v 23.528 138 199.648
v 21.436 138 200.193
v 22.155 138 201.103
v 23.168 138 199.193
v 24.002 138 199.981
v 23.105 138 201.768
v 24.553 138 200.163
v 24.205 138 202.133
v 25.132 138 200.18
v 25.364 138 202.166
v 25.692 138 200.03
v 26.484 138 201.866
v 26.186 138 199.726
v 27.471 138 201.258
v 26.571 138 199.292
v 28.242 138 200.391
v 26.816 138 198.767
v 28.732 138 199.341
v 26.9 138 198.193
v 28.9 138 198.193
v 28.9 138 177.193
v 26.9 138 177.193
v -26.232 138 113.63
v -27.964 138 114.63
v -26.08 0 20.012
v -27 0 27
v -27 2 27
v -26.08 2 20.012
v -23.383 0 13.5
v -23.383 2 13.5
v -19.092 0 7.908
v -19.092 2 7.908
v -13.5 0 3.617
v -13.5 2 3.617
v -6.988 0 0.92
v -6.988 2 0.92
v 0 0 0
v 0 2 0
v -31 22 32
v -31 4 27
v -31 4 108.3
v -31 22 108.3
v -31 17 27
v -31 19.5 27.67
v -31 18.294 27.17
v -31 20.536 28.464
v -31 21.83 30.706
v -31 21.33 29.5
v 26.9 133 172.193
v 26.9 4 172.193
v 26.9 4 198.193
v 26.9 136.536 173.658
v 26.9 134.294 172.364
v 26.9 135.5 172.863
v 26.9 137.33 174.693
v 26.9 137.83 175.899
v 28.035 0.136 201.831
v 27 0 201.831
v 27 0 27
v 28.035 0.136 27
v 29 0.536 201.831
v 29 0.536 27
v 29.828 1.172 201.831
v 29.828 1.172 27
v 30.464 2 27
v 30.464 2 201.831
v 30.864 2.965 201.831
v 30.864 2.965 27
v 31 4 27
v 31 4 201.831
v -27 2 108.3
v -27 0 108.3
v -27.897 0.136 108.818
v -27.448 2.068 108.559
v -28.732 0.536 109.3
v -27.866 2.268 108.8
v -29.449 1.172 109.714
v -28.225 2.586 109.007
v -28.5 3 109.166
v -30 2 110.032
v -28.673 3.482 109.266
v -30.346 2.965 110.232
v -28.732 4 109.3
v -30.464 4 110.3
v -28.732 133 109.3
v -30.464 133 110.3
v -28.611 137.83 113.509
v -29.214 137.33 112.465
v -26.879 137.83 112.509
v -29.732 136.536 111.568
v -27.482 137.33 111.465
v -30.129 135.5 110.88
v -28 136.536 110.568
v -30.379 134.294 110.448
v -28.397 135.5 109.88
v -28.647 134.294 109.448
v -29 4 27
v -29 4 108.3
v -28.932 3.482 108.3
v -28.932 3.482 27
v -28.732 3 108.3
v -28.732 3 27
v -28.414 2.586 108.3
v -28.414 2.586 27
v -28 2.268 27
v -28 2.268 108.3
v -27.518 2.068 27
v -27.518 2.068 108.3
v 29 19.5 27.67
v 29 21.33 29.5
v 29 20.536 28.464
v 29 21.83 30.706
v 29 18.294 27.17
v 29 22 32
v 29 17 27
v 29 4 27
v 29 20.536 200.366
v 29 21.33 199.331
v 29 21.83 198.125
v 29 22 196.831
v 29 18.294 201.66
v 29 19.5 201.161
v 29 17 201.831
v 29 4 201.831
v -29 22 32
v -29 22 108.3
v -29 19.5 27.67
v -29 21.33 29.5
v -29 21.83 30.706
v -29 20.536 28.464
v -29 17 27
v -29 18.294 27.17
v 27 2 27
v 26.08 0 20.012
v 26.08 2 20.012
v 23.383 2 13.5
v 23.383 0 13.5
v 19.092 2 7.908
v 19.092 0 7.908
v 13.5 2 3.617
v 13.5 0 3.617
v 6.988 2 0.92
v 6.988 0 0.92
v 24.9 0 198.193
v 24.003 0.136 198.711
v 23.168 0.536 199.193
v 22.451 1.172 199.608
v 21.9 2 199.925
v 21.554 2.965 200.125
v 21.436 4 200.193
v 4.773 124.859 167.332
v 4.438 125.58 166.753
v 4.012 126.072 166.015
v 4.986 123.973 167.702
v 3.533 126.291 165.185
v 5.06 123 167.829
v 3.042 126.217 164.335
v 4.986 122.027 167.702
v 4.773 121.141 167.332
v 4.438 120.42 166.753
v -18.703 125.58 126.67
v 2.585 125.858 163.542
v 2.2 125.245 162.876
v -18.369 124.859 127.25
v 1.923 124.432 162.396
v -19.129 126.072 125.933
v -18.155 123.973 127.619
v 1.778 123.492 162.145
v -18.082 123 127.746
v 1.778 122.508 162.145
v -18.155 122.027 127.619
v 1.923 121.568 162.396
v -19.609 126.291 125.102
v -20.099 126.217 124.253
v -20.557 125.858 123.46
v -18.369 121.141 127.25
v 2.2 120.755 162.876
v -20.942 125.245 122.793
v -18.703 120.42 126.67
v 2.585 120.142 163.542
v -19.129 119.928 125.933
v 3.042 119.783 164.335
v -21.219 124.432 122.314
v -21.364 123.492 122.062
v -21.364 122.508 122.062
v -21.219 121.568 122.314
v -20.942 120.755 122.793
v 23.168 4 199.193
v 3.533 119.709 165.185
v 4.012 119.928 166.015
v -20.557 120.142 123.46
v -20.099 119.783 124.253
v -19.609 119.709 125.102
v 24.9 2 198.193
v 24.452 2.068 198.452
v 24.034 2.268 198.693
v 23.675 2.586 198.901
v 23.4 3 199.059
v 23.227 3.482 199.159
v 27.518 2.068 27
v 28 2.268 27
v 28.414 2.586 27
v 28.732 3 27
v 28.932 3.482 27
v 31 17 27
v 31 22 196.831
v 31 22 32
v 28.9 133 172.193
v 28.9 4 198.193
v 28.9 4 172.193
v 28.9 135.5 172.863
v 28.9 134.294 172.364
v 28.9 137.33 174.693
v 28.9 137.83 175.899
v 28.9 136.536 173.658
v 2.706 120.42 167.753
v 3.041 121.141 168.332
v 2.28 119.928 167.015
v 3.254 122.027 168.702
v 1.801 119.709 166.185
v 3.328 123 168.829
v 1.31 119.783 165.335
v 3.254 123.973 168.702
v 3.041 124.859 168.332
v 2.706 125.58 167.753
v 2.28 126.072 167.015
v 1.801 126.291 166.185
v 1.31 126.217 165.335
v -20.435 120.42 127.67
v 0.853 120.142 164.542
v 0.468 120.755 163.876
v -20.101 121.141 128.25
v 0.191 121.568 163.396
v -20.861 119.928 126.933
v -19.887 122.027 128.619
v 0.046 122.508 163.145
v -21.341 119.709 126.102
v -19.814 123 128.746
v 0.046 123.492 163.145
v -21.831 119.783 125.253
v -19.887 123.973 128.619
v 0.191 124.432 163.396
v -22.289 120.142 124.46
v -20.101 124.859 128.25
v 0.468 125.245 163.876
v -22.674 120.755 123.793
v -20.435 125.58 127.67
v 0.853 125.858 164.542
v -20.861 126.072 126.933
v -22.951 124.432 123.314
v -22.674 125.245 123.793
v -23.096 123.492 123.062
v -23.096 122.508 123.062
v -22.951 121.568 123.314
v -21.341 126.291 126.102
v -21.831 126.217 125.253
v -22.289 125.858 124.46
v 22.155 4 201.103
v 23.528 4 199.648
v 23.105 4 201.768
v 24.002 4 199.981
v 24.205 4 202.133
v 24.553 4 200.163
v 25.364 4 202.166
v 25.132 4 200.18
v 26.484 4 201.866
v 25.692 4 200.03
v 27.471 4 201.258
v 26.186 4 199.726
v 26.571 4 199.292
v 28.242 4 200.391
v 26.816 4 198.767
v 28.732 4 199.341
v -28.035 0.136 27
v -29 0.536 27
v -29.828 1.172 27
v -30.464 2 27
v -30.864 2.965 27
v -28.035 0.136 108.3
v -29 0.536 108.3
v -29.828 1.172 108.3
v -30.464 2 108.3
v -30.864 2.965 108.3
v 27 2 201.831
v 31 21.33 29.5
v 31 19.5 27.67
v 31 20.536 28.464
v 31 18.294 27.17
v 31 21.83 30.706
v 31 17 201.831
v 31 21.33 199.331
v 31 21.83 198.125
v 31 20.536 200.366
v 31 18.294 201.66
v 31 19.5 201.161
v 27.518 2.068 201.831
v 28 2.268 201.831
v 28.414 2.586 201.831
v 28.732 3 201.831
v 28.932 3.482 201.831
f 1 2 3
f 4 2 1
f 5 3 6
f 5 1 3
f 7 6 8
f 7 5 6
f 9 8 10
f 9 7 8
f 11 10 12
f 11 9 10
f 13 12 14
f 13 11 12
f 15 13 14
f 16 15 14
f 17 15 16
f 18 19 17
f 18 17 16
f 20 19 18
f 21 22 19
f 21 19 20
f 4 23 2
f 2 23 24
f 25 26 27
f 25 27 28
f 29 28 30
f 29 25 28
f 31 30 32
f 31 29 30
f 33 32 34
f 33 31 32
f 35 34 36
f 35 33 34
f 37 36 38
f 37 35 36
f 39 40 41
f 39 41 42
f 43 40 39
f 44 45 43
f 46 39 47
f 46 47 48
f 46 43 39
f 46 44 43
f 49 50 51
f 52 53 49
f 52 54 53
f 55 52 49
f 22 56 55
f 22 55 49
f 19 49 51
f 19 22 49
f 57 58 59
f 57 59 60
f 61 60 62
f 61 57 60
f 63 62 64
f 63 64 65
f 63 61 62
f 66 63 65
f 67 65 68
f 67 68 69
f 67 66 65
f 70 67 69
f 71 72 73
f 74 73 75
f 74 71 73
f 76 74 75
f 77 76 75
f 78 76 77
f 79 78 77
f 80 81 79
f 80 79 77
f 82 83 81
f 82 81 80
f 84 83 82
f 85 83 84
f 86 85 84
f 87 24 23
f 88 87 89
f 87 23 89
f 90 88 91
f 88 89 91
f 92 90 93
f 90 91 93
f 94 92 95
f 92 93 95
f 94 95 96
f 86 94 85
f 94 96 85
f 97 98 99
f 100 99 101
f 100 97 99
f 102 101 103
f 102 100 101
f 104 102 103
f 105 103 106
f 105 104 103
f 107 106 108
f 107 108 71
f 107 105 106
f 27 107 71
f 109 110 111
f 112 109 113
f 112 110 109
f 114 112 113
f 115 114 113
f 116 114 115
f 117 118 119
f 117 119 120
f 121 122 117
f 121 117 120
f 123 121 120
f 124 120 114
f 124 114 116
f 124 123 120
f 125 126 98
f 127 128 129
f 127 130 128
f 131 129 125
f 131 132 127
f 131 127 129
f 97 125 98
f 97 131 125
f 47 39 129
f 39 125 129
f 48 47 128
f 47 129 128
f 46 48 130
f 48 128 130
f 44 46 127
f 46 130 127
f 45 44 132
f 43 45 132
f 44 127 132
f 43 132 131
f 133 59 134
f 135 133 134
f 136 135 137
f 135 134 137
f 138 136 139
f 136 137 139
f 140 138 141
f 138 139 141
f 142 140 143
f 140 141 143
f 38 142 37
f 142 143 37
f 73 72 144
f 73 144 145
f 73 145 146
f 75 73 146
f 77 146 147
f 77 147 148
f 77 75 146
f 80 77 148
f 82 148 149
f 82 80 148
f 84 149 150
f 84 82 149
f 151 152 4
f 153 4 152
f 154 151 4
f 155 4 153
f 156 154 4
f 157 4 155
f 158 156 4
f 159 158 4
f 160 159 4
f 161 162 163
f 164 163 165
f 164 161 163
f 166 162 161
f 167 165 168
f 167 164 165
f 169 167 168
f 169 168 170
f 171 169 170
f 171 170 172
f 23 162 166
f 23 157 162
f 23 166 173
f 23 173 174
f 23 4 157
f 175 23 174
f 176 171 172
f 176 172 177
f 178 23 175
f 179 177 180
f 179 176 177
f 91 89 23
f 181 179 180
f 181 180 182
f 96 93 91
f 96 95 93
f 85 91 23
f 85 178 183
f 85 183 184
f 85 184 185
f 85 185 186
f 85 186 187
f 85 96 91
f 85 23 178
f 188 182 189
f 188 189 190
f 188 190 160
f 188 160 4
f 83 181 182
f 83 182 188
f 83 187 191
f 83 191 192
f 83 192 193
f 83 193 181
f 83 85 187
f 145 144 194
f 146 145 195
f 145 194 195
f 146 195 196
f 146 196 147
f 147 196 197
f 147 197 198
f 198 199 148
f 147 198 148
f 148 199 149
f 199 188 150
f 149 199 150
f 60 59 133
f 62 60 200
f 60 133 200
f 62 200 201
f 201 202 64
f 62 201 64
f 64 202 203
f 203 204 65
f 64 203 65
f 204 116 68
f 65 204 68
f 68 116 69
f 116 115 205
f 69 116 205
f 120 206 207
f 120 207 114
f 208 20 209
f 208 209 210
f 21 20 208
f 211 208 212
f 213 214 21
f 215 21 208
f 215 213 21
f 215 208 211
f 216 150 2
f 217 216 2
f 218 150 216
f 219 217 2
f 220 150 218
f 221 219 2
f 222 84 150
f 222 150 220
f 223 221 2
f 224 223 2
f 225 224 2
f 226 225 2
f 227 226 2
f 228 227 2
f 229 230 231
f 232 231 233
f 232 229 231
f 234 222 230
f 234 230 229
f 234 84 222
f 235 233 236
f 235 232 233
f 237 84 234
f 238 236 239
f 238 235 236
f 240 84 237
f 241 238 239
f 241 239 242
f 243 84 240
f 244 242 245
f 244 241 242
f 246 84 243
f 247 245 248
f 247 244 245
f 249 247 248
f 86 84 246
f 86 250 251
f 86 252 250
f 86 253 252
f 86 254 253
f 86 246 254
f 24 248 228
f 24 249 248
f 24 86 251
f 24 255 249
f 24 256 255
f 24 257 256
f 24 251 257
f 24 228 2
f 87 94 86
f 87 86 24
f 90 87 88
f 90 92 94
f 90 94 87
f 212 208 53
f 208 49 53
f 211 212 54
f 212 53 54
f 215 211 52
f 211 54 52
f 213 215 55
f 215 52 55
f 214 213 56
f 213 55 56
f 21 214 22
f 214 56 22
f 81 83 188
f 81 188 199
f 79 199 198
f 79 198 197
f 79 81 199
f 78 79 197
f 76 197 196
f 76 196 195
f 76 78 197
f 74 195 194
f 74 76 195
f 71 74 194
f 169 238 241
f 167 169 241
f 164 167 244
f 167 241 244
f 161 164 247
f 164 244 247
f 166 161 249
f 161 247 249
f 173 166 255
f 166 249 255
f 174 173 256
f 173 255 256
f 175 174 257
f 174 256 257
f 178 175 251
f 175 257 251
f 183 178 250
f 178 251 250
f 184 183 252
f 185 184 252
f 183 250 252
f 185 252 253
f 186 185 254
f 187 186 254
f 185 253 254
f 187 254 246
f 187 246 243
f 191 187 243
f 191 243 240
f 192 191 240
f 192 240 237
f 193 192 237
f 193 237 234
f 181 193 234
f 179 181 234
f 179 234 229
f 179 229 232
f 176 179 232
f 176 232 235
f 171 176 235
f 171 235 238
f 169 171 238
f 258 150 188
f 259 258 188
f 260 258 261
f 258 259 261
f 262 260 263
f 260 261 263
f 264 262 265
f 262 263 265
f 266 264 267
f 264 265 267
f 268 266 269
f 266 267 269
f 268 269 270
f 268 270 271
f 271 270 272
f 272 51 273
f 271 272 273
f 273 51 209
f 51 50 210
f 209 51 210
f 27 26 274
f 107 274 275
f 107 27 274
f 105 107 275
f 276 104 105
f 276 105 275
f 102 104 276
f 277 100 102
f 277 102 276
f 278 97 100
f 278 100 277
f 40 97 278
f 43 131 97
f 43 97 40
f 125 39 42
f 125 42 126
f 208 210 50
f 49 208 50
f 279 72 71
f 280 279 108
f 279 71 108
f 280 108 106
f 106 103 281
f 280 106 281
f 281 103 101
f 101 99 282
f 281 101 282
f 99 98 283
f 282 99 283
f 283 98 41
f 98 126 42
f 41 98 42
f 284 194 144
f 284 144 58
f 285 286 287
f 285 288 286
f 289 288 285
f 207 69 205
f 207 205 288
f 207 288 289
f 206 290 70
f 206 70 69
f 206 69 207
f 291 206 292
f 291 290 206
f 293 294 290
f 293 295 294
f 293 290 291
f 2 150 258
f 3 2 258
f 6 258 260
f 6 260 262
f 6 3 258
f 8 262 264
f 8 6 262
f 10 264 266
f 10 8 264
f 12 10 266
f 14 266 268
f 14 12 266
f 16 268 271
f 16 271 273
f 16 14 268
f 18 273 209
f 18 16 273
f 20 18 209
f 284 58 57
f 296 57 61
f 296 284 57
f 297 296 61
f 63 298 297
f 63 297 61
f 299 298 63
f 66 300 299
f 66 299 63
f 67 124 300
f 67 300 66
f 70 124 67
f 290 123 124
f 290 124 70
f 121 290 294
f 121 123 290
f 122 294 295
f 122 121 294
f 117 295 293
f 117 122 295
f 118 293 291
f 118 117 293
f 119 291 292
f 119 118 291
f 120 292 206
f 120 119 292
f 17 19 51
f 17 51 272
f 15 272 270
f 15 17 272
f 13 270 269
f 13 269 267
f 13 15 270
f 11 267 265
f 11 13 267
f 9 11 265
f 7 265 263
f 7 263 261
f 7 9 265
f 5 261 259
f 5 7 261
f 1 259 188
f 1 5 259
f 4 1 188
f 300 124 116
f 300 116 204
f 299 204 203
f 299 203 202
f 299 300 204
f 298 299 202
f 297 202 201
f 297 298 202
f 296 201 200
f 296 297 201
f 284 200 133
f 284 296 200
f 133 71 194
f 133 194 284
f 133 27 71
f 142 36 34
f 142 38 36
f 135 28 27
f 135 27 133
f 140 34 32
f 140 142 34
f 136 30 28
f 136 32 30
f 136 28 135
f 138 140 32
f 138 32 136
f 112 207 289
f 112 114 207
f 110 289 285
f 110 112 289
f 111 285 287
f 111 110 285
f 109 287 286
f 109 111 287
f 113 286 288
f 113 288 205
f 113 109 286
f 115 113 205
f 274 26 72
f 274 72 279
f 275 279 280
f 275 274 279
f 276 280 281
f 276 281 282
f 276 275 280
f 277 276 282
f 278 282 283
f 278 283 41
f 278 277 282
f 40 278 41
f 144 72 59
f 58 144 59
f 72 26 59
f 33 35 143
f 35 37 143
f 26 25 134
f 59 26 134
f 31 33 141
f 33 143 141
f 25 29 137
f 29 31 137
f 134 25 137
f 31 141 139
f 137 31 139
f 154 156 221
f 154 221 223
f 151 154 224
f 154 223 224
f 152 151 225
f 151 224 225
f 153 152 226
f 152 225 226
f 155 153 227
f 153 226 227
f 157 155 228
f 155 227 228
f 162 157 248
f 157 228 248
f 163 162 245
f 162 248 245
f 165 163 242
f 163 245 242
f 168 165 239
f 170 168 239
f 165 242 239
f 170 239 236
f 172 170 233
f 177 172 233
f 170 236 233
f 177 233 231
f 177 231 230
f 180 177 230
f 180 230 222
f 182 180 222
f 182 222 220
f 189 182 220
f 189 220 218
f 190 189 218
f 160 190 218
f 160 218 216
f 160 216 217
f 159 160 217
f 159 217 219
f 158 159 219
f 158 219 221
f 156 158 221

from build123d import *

# Parameters (mm, degrees)
BOSS_EXTRUDE1_DEPTH     = 2
BOSS_EXTRUDE3_DEPTH     = 2
EDGE_FLANGE1_DEPTH      = 81.3
EDGE_FLANGE1_BEND_DEPTH = 174.830743609
EDGE_FLANGE2_DEPTH      = 103.8
EDGE_FLANGE3_DEPTH      = 134
M6_CLEARANCE_HOLE1_D    = 6.6
FILLET1_R               = 5


# Sheet-metal steps are written as plain solids
with BuildPart() as part:
    # Sketch1 → Boss-Extrude1 (new body)
    with BuildSketch(Plane(origin=(0, 0, 0), x_dir=(1, 0, 0), z_dir=(0, 1, 0))):
        with BuildLine():
            Line((-27, -108.3), (-27, -27))
            ThreePointArc((-27, -27), (-19.091883092, -7.908116908), (0, 0))
            Line((0, 0), (0, -108.3))
            Line((0, -108.3), (-27, -108.3))
        make_face()
    boss_extrude1 = extrude(amount=BOSS_EXTRUDE1_DEPTH)

    # Mirror1: Boss-Extrude1 across plane
    add(boss_extrude1.mirror(Plane(origin=(0, 0, 0), x_dir=(0, 0, 1), z_dir=(1, 0, 0))))

    # Sketch15 → Boss-Extrude3 (add)
    with BuildSketch(Plane(origin=(0, 2, 0), x_dir=(1, 0, 0), z_dir=(0, 1, 0))):
        Polygon((-27, -108.3), (27, -201.830743609), (27, -108.3), align=None)
    extrude(amount=-BOSS_EXTRUDE3_DEPTH)

    # Edge-Flange1 section (across the edge) → Edge-Flange1 (add)
    with BuildSketch(Plane(origin=(-29, 2, 27), x_dir=(1, 0, 0), z_dir=(0, 0, 1))):
        with BuildLine():
            Line((-2, 2), (-2, 20))
            Line((-2, 20), (0, 20))
            Line((0, 20), (0, 2))
            ThreePointArc((0, 2), (0.585786438, 0.585786438), (2, 0))
            Line((2, 0), (2, -2))
            ThreePointArc((2, -2), (-0.828427125, -0.828427125), (-2, 2))
        make_face()
    extrude(amount=EDGE_FLANGE1_DEPTH)

    # Edge-Flange1 section 2 (across the edge) → Edge-Flange1 bend (add)
    with BuildSketch(Plane(origin=(29, 2, 201.830743609), x_dir=(-1, 0, 0), z_dir=(0, 0, -1))):
        with BuildLine():
            Line((-2, 2), (-2, 20))
            Line((-2, 20), (0, 20))
            Line((0, 20), (0, 2))
            ThreePointArc((0, 2), (0.585786438, 0.585786438), (2, 0))
            Line((2, 0), (2, -2))
            ThreePointArc((2, -2), (-0.828427125, -0.828427125), (-2, 2))
        make_face()
    extrude(amount=EDGE_FLANGE1_BEND_DEPTH)

    # Edge-Flange2 section (across the edge) → Edge-Flange2 (add)
    with BuildSketch(Plane(origin=(-28.732050808, 2, 109.3), x_dir=(0.8660254037844362, 3.491481338843134e-15, -0.5000000000000044), z_dir=(0.5000000000000044, 0, 0.8660254037844362))):
        with BuildLine():
            Line((-2, 2), (-2, 136))
            Line((-2, 136), (0, 136))
            Line((0, 136), (0, 2))
            ThreePointArc((0, 2), (0.585786438, 0.585786438), (2, 0))
            Line((2, 0), (2, -2))
            ThreePointArc((2, -2), (-0.828427125, -0.828427125), (-2, 2))
        make_face()
    extrude(amount=EDGE_FLANGE2_DEPTH)

    # Edge-Flange3 section (across the edge) → Edge-Flange3 (add)
    with BuildSketch(Plane(origin=(26.9, 138, 205.657538528), x_dir=(-1, 0, 0), z_dir=(0, -1, 0))):
        with BuildLine():
            Line((-2, 7.464101615), (-2, 33.464101615))
            Line((-2, 33.464101615), (0, 33.464101615))
            Line((0, 33.464101615), (0, 7.464101615))
            ThreePointArc((0, 7.464101615), (1.48236191, 5.532249963), (3.732050808, 6.464101615))
            Line((3.732050808, 6.464101615), (5.464101615, 5.464101615))
            ThreePointArc((5.464101615, 5.464101615), (0.96472382, 3.60039831), (-2, 7.464101615))
        make_face()
    extrude(amount=EDGE_FLANGE3_DEPTH)

    # M6 Clearance Hole1 (through all)
    with Locations(Plane(origin=(-68.877326422, 0, 39.766342951), x_dir=(-0.5000000000000046, -2.00195274507357e-15, -0.8660254037844362), z_dir=(0.8660254037844362, 3.4674838688193673e-15, -0.5000000000000046))):
        with Locations((-144.573890731, 123), (-98.29055123, 123)):
            Hole(M6_CLEARANCE_HOLE1_D / 2)

    # Fillet1
    fillet1_edges = [part.edges().sort_by_distance(p)[0] for p in [
        (-30, 22, 27),
        (30, 22, 201.830743609),
        (30, 22, 27),
        (-29.598076211, 138, 109.8),
        (27.9, 138, 172.193436913),
    ]]
    fillet(fillet1_edges, radius=FILLET1_R)


solid = part.part
